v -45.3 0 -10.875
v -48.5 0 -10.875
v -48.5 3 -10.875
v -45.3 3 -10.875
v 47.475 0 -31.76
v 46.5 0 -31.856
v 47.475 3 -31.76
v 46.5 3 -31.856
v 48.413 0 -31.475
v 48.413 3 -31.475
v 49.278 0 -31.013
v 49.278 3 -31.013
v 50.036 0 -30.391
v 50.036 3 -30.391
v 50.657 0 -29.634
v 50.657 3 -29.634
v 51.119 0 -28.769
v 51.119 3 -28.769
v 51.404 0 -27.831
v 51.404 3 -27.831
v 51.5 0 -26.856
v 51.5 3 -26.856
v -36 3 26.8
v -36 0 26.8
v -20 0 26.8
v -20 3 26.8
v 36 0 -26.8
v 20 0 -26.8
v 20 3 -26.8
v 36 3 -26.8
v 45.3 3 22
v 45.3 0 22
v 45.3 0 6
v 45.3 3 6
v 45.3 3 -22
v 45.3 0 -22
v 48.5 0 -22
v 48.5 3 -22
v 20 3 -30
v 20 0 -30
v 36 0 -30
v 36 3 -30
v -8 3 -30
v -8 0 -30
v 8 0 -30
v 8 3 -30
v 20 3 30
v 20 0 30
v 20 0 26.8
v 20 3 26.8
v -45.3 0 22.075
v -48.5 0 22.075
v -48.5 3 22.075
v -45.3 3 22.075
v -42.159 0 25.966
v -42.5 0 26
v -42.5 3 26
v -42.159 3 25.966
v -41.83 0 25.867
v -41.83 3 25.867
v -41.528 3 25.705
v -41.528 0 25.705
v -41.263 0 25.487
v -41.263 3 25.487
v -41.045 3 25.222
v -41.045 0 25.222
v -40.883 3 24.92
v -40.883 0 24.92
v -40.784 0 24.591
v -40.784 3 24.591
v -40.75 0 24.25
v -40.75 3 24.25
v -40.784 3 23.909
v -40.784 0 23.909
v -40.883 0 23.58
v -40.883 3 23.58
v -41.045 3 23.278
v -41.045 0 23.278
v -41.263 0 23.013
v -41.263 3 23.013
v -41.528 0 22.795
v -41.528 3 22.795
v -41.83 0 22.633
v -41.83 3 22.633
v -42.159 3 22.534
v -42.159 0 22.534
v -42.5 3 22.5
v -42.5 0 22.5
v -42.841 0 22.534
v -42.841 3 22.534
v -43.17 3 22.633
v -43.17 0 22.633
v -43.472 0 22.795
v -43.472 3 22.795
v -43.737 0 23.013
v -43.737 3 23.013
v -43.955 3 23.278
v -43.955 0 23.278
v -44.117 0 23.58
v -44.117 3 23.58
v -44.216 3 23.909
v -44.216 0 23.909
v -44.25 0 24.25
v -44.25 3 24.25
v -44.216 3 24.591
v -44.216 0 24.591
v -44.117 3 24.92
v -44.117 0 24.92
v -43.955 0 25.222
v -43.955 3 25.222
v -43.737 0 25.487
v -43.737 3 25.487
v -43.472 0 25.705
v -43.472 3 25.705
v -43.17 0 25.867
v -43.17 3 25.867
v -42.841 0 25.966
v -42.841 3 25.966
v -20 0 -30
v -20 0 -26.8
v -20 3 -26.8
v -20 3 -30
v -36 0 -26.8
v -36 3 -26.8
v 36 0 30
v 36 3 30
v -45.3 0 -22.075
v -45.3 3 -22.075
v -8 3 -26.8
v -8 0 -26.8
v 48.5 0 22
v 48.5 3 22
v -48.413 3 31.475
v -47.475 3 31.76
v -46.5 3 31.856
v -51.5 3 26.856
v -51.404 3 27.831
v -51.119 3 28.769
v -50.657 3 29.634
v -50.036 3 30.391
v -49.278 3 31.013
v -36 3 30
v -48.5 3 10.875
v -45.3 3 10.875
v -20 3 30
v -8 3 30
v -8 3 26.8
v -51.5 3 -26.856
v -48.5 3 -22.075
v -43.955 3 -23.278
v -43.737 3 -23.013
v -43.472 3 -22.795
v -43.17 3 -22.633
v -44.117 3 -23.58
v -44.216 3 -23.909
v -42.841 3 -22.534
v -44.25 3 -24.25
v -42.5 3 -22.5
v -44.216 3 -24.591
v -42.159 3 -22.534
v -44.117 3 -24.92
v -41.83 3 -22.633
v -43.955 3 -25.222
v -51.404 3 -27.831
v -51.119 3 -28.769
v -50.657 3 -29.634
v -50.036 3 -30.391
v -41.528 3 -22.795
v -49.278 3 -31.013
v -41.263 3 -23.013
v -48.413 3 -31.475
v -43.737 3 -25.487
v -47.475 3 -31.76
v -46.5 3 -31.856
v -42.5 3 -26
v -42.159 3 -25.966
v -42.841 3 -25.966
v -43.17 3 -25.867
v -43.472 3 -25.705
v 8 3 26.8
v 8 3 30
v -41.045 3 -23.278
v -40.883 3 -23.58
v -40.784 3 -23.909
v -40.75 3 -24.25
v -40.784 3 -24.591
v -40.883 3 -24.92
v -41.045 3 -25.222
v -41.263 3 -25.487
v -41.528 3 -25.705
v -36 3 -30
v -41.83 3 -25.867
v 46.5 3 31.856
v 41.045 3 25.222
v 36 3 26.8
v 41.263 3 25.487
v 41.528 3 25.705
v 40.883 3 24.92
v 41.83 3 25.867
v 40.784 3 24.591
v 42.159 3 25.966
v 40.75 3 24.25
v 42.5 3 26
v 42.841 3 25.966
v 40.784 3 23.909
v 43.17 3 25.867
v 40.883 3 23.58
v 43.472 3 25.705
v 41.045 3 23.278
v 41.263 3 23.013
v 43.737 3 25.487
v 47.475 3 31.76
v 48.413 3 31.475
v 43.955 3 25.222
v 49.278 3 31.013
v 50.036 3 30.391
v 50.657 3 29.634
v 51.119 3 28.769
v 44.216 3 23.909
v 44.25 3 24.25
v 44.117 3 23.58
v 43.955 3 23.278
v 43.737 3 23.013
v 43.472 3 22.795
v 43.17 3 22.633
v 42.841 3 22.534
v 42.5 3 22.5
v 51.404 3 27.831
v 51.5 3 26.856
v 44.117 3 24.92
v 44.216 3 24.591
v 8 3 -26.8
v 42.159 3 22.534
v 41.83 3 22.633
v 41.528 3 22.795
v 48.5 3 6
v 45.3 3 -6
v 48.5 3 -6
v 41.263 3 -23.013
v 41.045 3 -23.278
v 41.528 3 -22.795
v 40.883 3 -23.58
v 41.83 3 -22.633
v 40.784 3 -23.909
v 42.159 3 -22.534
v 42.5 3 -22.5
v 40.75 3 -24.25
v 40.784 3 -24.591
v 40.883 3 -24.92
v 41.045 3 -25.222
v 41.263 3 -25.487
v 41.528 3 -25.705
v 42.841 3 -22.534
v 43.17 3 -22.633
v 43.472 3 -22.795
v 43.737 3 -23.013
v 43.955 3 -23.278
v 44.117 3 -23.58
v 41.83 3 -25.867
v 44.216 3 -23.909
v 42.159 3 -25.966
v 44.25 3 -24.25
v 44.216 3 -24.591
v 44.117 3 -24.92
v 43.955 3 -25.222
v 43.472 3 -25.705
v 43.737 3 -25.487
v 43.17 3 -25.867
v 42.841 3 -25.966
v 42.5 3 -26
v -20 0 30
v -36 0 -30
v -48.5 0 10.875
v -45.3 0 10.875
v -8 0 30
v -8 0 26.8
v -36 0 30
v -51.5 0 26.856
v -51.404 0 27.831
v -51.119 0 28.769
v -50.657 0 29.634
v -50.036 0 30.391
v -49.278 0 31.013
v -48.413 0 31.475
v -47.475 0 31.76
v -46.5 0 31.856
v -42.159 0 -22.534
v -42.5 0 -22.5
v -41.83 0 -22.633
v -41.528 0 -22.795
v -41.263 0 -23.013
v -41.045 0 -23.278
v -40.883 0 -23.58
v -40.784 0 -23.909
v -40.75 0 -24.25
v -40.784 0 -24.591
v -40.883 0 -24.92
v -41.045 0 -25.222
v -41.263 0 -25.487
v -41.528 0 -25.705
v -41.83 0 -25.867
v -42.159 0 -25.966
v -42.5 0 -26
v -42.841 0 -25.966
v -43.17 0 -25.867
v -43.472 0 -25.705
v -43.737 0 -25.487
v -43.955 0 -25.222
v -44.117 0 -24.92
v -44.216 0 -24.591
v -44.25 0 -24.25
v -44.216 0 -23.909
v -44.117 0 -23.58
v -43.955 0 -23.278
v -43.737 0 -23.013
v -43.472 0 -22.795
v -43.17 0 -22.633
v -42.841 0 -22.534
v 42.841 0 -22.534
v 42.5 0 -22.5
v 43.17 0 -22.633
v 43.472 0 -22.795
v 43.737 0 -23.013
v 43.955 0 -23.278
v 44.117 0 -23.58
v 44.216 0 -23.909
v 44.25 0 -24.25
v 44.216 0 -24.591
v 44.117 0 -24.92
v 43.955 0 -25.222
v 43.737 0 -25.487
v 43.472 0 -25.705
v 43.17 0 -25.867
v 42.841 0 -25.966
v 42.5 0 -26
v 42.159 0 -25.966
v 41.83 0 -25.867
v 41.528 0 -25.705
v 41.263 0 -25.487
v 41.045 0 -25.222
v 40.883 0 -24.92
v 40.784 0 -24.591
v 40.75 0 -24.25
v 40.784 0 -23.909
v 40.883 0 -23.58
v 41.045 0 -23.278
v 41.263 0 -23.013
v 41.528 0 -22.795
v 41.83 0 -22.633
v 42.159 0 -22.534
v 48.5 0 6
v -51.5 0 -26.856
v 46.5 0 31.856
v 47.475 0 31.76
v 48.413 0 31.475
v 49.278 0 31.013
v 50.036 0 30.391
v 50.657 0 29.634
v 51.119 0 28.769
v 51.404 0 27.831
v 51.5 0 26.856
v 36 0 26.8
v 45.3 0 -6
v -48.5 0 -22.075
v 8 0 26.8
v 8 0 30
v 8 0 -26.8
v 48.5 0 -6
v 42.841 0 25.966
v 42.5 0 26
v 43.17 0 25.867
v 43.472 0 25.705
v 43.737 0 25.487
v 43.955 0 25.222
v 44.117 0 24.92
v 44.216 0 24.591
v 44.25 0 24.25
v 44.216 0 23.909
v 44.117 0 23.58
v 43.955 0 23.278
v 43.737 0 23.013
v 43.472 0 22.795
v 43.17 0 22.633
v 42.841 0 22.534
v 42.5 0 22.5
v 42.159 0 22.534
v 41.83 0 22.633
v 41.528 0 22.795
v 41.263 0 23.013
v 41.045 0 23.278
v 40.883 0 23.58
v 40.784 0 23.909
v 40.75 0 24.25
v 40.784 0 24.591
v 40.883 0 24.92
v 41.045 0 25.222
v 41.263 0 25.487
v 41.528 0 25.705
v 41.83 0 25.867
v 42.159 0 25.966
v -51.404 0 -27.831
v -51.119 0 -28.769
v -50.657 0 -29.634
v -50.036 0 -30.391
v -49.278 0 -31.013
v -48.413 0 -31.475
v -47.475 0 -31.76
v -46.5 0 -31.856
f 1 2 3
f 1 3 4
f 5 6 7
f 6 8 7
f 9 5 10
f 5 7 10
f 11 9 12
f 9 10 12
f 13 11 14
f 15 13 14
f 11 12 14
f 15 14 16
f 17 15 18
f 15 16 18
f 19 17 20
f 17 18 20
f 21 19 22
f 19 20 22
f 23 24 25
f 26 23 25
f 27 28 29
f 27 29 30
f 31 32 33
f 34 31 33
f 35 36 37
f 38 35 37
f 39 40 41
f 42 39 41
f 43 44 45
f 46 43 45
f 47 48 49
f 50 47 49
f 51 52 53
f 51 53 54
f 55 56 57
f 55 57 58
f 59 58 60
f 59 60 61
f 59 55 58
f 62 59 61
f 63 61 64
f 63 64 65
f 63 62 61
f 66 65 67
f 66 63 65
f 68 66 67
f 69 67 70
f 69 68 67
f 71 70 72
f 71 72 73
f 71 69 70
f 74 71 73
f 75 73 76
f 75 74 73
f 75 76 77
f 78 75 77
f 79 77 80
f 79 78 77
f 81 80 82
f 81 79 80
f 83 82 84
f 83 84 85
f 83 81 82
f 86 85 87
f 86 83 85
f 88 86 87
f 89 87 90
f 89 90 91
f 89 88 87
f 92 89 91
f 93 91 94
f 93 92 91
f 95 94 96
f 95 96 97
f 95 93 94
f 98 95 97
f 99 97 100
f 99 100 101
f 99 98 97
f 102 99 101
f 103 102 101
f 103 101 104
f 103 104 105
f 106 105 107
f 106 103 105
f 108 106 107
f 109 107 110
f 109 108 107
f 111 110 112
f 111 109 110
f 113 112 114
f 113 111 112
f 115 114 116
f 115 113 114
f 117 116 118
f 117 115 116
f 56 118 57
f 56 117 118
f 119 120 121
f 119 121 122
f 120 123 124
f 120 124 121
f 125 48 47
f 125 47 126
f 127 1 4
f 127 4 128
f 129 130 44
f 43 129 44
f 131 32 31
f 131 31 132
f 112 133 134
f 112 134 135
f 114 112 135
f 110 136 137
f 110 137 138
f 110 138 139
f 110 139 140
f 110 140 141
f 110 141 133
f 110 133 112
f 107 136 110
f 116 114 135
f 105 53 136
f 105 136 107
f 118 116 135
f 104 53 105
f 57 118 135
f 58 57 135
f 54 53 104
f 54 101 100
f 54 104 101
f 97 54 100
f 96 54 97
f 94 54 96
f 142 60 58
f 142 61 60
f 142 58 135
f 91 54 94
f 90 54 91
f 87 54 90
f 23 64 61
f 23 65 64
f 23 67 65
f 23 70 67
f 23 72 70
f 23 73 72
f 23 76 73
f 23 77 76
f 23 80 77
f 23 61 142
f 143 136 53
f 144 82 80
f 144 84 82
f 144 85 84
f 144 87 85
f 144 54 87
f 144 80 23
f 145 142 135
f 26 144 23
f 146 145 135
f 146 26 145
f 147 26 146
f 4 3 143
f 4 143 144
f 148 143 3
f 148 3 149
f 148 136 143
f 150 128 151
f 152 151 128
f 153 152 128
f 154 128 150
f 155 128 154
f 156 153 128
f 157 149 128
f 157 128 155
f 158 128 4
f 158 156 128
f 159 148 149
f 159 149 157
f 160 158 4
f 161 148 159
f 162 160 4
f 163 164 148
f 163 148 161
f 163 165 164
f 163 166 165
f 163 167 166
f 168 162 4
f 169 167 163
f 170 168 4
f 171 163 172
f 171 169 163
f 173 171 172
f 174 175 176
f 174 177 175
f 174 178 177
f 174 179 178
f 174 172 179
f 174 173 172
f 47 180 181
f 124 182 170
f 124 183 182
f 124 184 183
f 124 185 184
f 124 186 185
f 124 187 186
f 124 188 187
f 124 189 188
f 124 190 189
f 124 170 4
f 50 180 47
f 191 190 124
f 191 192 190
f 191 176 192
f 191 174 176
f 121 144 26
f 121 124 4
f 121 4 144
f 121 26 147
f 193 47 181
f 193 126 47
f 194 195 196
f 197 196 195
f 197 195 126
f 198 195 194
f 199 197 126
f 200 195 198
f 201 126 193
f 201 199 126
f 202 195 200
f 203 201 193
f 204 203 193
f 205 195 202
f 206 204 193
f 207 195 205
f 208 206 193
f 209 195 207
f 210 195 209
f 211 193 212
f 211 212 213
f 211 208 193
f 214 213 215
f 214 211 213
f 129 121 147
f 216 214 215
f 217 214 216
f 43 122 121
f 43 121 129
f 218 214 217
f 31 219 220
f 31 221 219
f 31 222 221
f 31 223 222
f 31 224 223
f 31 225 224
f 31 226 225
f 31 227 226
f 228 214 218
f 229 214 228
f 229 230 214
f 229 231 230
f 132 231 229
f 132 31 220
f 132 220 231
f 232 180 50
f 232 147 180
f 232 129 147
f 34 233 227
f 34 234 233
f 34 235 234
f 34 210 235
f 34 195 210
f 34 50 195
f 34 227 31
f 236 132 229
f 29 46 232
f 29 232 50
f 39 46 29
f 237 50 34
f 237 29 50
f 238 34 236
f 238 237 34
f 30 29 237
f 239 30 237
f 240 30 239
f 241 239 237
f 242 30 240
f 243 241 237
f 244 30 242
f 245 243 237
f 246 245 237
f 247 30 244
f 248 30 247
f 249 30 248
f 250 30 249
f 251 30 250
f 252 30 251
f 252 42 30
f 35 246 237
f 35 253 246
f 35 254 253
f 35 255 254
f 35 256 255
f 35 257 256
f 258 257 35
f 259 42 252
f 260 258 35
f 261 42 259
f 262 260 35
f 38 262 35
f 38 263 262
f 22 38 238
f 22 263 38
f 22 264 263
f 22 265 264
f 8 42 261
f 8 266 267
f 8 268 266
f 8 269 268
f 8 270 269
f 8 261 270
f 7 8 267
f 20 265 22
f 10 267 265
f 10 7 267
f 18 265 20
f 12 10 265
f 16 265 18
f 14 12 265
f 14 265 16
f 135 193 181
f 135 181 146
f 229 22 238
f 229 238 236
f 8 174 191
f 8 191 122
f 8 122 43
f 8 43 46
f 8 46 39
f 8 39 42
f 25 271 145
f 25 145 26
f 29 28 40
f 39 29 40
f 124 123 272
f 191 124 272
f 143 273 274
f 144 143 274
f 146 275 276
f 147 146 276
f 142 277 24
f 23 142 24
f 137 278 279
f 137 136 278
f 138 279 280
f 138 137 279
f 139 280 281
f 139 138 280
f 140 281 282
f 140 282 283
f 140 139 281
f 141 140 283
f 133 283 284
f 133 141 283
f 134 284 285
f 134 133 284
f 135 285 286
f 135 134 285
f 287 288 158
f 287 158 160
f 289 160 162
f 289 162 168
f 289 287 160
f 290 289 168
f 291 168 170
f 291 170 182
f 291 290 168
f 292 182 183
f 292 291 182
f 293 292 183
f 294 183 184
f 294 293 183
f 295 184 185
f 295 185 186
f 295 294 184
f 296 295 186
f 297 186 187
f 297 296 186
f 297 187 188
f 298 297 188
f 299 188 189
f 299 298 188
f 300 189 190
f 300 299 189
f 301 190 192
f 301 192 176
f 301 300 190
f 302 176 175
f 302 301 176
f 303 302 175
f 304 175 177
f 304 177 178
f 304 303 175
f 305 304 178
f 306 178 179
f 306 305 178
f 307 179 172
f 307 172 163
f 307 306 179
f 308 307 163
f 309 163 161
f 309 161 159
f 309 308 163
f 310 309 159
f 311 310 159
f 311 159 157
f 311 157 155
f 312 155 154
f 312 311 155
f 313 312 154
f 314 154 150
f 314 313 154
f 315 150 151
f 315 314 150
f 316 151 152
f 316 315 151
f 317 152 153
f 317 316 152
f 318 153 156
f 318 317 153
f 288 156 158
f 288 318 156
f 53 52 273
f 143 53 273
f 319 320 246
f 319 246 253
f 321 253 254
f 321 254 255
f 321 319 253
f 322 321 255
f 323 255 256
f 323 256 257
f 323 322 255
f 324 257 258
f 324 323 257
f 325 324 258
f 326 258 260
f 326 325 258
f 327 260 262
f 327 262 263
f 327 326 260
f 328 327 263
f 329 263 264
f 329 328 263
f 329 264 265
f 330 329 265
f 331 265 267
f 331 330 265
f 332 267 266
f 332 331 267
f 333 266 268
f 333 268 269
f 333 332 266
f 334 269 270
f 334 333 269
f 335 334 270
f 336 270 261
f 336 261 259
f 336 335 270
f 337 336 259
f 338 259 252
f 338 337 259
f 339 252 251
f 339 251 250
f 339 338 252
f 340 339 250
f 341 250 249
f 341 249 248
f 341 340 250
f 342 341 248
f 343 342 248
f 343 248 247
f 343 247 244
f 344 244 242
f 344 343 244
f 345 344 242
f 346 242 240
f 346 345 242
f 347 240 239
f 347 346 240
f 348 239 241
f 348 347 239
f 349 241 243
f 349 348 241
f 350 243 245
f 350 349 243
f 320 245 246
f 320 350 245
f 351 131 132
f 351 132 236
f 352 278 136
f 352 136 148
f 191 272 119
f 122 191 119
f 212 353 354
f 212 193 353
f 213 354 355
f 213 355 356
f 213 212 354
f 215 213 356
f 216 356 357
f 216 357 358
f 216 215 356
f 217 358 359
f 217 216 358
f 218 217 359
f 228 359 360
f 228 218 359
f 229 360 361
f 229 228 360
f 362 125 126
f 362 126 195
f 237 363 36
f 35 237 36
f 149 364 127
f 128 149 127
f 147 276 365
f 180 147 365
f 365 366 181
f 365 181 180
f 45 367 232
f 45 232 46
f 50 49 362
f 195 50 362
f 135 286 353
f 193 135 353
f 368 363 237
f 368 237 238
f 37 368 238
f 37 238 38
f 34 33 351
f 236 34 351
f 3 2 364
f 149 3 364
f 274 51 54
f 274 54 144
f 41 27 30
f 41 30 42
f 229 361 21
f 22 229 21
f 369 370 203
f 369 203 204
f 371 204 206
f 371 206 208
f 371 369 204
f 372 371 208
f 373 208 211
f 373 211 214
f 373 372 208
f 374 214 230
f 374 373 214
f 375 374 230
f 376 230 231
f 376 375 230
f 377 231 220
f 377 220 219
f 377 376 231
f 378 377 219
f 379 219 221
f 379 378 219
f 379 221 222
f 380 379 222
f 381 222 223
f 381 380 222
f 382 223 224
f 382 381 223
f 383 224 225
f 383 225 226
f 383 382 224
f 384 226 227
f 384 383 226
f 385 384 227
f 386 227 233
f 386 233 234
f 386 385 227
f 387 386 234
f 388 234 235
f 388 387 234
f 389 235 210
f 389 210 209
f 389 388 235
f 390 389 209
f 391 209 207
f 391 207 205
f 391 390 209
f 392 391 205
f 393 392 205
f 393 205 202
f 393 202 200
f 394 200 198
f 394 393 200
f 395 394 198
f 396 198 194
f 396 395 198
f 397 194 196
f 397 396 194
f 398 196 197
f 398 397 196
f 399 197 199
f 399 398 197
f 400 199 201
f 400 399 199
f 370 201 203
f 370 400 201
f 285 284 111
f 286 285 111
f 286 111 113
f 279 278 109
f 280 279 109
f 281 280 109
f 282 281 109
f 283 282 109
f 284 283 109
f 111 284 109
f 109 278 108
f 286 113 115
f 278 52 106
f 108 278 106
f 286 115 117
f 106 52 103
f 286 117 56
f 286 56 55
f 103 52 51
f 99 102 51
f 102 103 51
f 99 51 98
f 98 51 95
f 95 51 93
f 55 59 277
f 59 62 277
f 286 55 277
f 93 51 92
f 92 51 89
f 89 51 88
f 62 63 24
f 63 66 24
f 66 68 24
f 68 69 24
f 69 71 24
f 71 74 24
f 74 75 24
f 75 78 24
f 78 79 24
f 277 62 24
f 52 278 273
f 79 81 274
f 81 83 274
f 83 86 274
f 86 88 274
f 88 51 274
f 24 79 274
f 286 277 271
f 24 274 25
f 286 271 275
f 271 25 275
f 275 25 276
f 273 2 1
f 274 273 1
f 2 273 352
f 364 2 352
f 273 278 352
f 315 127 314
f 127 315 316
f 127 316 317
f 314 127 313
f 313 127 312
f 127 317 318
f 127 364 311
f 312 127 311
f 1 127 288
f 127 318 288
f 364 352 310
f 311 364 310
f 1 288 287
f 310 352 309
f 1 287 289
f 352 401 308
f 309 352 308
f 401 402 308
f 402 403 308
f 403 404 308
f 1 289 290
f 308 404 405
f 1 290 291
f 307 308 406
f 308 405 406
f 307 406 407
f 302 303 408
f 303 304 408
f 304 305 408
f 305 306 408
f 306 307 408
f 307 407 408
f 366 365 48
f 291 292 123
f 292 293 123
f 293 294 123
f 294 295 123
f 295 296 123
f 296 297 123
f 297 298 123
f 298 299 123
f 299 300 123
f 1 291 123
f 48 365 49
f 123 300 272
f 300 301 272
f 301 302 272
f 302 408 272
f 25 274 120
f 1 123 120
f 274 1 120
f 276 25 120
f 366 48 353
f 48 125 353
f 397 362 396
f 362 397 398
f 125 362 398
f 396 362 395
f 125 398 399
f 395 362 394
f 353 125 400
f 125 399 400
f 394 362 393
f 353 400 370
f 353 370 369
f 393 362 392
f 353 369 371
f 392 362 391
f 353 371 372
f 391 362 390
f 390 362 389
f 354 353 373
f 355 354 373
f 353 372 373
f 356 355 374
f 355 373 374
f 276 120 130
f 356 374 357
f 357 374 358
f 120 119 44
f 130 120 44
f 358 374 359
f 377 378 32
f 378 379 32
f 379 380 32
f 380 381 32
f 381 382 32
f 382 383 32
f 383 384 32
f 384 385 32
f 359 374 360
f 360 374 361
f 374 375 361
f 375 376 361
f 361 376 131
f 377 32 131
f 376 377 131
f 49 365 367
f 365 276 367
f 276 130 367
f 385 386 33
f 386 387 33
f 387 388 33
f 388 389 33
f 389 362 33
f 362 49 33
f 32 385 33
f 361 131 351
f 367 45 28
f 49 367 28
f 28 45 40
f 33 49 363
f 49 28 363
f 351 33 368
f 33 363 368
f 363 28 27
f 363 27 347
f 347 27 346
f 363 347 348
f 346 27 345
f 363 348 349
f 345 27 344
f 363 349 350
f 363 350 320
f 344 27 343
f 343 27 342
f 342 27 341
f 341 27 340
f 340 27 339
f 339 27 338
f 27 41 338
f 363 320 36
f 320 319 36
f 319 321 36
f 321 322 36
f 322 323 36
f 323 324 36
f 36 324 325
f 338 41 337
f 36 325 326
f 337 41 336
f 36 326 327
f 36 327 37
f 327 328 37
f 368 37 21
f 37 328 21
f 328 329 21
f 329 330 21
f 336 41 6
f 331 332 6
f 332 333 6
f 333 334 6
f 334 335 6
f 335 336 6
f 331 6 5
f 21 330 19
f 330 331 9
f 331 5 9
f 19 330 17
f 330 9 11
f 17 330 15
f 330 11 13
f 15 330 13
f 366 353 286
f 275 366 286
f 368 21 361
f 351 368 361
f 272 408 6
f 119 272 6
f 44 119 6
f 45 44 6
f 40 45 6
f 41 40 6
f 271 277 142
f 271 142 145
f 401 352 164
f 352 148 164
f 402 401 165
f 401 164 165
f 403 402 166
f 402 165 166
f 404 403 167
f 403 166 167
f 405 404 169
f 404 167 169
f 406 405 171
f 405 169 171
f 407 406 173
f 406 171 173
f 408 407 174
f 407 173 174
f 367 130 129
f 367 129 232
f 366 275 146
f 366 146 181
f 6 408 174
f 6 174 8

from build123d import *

# Parameters (mm, degrees)
SKETCH1_W           = 103
SKETCH1_H           = 63.711340206
SKETCH1_R           = 1.75
SKETCH1_W_2         = 16
SKETCH1_H_2         = 3.2
SKETCH1_W_3         = 3.2
SKETCH1_H_3         = 11.2
SKETCH1_H_4         = 16
BOSS_EXTRUDE1_DEPTH = 3
FILLET1_R           = 5


with BuildPart() as part:
    # Sketch1 → Boss-Extrude1 (new body)
    with BuildSketch(Plane(origin=(0, 0, 0), x_dir=(1, 0, 0), z_dir=(0, 1, 0))):
        Rectangle(SKETCH1_W, SKETCH1_H)
        with Locations(Location((-42.5, 24.25, 0), (0, 0, 270))):
            Circle(SKETCH1_R, mode=Mode.SUBTRACT)
        with Locations(Location((42.5, 24.25, 0), (0, 0, 270))):
            Circle(SKETCH1_R, mode=Mode.SUBTRACT)
        with Locations(Location((-42.5, -24.25, 0), (0, 0, 270))):
            Circle(SKETCH1_R, mode=Mode.SUBTRACT)
        with Locations(Location((42.5, -24.25, 0), (0, 0, 270))):
            Circle(SKETCH1_R, mode=Mode.SUBTRACT)
        with Locations((-28, 28.4)):
            Rectangle(SKETCH1_W_2, SKETCH1_H_2, mode=Mode.SUBTRACT)
        with Locations((28, 28.4)):
            Rectangle(SKETCH1_W_2, SKETCH1_H_2, mode=Mode.SUBTRACT)
        with Locations((-46.9, 16.475)):
            Rectangle(SKETCH1_W_3, SKETCH1_H_3, mode=Mode.SUBTRACT)
        with Locations((-46.9, -16.475)):
            Rectangle(SKETCH1_W_3, SKETCH1_H_3, mode=Mode.SUBTRACT)
        with Locations((0, 28.4)):
            Rectangle(SKETCH1_W_2, SKETCH1_H_2, mode=Mode.SUBTRACT)
        with Locations((-28, -28.4)):
            Rectangle(SKETCH1_W_2, SKETCH1_H_2, mode=Mode.SUBTRACT)
        with Locations((28, -28.4)):
            Rectangle(SKETCH1_W_2, SKETCH1_H_2, mode=Mode.SUBTRACT)
        with Locations((0, -28.4)):
            Rectangle(SKETCH1_W_2, SKETCH1_H_2, mode=Mode.SUBTRACT)
        with Locations((46.9, -14)):
            Rectangle(SKETCH1_W_3, SKETCH1_H_4, mode=Mode.SUBTRACT)
        with Locations((46.9, 14)):
            Rectangle(SKETCH1_W_3, SKETCH1_H_4, mode=Mode.SUBTRACT)
    extrude(amount=BOSS_EXTRUDE1_DEPTH)

    # Fillet1
    fillet1_edges = [part.edges().sort_by_distance(p)[0] for p in [
        (51.5, 1.5, 31.855670103),
        (-51.5, 1.5, 31.855670103),
        (-51.5, 1.5, -31.855670103),
        (51.5, 1.5, -31.855670103),
    ]]
    fillet(fillet1_edges, radius=FILLET1_R)


solid = part.part
